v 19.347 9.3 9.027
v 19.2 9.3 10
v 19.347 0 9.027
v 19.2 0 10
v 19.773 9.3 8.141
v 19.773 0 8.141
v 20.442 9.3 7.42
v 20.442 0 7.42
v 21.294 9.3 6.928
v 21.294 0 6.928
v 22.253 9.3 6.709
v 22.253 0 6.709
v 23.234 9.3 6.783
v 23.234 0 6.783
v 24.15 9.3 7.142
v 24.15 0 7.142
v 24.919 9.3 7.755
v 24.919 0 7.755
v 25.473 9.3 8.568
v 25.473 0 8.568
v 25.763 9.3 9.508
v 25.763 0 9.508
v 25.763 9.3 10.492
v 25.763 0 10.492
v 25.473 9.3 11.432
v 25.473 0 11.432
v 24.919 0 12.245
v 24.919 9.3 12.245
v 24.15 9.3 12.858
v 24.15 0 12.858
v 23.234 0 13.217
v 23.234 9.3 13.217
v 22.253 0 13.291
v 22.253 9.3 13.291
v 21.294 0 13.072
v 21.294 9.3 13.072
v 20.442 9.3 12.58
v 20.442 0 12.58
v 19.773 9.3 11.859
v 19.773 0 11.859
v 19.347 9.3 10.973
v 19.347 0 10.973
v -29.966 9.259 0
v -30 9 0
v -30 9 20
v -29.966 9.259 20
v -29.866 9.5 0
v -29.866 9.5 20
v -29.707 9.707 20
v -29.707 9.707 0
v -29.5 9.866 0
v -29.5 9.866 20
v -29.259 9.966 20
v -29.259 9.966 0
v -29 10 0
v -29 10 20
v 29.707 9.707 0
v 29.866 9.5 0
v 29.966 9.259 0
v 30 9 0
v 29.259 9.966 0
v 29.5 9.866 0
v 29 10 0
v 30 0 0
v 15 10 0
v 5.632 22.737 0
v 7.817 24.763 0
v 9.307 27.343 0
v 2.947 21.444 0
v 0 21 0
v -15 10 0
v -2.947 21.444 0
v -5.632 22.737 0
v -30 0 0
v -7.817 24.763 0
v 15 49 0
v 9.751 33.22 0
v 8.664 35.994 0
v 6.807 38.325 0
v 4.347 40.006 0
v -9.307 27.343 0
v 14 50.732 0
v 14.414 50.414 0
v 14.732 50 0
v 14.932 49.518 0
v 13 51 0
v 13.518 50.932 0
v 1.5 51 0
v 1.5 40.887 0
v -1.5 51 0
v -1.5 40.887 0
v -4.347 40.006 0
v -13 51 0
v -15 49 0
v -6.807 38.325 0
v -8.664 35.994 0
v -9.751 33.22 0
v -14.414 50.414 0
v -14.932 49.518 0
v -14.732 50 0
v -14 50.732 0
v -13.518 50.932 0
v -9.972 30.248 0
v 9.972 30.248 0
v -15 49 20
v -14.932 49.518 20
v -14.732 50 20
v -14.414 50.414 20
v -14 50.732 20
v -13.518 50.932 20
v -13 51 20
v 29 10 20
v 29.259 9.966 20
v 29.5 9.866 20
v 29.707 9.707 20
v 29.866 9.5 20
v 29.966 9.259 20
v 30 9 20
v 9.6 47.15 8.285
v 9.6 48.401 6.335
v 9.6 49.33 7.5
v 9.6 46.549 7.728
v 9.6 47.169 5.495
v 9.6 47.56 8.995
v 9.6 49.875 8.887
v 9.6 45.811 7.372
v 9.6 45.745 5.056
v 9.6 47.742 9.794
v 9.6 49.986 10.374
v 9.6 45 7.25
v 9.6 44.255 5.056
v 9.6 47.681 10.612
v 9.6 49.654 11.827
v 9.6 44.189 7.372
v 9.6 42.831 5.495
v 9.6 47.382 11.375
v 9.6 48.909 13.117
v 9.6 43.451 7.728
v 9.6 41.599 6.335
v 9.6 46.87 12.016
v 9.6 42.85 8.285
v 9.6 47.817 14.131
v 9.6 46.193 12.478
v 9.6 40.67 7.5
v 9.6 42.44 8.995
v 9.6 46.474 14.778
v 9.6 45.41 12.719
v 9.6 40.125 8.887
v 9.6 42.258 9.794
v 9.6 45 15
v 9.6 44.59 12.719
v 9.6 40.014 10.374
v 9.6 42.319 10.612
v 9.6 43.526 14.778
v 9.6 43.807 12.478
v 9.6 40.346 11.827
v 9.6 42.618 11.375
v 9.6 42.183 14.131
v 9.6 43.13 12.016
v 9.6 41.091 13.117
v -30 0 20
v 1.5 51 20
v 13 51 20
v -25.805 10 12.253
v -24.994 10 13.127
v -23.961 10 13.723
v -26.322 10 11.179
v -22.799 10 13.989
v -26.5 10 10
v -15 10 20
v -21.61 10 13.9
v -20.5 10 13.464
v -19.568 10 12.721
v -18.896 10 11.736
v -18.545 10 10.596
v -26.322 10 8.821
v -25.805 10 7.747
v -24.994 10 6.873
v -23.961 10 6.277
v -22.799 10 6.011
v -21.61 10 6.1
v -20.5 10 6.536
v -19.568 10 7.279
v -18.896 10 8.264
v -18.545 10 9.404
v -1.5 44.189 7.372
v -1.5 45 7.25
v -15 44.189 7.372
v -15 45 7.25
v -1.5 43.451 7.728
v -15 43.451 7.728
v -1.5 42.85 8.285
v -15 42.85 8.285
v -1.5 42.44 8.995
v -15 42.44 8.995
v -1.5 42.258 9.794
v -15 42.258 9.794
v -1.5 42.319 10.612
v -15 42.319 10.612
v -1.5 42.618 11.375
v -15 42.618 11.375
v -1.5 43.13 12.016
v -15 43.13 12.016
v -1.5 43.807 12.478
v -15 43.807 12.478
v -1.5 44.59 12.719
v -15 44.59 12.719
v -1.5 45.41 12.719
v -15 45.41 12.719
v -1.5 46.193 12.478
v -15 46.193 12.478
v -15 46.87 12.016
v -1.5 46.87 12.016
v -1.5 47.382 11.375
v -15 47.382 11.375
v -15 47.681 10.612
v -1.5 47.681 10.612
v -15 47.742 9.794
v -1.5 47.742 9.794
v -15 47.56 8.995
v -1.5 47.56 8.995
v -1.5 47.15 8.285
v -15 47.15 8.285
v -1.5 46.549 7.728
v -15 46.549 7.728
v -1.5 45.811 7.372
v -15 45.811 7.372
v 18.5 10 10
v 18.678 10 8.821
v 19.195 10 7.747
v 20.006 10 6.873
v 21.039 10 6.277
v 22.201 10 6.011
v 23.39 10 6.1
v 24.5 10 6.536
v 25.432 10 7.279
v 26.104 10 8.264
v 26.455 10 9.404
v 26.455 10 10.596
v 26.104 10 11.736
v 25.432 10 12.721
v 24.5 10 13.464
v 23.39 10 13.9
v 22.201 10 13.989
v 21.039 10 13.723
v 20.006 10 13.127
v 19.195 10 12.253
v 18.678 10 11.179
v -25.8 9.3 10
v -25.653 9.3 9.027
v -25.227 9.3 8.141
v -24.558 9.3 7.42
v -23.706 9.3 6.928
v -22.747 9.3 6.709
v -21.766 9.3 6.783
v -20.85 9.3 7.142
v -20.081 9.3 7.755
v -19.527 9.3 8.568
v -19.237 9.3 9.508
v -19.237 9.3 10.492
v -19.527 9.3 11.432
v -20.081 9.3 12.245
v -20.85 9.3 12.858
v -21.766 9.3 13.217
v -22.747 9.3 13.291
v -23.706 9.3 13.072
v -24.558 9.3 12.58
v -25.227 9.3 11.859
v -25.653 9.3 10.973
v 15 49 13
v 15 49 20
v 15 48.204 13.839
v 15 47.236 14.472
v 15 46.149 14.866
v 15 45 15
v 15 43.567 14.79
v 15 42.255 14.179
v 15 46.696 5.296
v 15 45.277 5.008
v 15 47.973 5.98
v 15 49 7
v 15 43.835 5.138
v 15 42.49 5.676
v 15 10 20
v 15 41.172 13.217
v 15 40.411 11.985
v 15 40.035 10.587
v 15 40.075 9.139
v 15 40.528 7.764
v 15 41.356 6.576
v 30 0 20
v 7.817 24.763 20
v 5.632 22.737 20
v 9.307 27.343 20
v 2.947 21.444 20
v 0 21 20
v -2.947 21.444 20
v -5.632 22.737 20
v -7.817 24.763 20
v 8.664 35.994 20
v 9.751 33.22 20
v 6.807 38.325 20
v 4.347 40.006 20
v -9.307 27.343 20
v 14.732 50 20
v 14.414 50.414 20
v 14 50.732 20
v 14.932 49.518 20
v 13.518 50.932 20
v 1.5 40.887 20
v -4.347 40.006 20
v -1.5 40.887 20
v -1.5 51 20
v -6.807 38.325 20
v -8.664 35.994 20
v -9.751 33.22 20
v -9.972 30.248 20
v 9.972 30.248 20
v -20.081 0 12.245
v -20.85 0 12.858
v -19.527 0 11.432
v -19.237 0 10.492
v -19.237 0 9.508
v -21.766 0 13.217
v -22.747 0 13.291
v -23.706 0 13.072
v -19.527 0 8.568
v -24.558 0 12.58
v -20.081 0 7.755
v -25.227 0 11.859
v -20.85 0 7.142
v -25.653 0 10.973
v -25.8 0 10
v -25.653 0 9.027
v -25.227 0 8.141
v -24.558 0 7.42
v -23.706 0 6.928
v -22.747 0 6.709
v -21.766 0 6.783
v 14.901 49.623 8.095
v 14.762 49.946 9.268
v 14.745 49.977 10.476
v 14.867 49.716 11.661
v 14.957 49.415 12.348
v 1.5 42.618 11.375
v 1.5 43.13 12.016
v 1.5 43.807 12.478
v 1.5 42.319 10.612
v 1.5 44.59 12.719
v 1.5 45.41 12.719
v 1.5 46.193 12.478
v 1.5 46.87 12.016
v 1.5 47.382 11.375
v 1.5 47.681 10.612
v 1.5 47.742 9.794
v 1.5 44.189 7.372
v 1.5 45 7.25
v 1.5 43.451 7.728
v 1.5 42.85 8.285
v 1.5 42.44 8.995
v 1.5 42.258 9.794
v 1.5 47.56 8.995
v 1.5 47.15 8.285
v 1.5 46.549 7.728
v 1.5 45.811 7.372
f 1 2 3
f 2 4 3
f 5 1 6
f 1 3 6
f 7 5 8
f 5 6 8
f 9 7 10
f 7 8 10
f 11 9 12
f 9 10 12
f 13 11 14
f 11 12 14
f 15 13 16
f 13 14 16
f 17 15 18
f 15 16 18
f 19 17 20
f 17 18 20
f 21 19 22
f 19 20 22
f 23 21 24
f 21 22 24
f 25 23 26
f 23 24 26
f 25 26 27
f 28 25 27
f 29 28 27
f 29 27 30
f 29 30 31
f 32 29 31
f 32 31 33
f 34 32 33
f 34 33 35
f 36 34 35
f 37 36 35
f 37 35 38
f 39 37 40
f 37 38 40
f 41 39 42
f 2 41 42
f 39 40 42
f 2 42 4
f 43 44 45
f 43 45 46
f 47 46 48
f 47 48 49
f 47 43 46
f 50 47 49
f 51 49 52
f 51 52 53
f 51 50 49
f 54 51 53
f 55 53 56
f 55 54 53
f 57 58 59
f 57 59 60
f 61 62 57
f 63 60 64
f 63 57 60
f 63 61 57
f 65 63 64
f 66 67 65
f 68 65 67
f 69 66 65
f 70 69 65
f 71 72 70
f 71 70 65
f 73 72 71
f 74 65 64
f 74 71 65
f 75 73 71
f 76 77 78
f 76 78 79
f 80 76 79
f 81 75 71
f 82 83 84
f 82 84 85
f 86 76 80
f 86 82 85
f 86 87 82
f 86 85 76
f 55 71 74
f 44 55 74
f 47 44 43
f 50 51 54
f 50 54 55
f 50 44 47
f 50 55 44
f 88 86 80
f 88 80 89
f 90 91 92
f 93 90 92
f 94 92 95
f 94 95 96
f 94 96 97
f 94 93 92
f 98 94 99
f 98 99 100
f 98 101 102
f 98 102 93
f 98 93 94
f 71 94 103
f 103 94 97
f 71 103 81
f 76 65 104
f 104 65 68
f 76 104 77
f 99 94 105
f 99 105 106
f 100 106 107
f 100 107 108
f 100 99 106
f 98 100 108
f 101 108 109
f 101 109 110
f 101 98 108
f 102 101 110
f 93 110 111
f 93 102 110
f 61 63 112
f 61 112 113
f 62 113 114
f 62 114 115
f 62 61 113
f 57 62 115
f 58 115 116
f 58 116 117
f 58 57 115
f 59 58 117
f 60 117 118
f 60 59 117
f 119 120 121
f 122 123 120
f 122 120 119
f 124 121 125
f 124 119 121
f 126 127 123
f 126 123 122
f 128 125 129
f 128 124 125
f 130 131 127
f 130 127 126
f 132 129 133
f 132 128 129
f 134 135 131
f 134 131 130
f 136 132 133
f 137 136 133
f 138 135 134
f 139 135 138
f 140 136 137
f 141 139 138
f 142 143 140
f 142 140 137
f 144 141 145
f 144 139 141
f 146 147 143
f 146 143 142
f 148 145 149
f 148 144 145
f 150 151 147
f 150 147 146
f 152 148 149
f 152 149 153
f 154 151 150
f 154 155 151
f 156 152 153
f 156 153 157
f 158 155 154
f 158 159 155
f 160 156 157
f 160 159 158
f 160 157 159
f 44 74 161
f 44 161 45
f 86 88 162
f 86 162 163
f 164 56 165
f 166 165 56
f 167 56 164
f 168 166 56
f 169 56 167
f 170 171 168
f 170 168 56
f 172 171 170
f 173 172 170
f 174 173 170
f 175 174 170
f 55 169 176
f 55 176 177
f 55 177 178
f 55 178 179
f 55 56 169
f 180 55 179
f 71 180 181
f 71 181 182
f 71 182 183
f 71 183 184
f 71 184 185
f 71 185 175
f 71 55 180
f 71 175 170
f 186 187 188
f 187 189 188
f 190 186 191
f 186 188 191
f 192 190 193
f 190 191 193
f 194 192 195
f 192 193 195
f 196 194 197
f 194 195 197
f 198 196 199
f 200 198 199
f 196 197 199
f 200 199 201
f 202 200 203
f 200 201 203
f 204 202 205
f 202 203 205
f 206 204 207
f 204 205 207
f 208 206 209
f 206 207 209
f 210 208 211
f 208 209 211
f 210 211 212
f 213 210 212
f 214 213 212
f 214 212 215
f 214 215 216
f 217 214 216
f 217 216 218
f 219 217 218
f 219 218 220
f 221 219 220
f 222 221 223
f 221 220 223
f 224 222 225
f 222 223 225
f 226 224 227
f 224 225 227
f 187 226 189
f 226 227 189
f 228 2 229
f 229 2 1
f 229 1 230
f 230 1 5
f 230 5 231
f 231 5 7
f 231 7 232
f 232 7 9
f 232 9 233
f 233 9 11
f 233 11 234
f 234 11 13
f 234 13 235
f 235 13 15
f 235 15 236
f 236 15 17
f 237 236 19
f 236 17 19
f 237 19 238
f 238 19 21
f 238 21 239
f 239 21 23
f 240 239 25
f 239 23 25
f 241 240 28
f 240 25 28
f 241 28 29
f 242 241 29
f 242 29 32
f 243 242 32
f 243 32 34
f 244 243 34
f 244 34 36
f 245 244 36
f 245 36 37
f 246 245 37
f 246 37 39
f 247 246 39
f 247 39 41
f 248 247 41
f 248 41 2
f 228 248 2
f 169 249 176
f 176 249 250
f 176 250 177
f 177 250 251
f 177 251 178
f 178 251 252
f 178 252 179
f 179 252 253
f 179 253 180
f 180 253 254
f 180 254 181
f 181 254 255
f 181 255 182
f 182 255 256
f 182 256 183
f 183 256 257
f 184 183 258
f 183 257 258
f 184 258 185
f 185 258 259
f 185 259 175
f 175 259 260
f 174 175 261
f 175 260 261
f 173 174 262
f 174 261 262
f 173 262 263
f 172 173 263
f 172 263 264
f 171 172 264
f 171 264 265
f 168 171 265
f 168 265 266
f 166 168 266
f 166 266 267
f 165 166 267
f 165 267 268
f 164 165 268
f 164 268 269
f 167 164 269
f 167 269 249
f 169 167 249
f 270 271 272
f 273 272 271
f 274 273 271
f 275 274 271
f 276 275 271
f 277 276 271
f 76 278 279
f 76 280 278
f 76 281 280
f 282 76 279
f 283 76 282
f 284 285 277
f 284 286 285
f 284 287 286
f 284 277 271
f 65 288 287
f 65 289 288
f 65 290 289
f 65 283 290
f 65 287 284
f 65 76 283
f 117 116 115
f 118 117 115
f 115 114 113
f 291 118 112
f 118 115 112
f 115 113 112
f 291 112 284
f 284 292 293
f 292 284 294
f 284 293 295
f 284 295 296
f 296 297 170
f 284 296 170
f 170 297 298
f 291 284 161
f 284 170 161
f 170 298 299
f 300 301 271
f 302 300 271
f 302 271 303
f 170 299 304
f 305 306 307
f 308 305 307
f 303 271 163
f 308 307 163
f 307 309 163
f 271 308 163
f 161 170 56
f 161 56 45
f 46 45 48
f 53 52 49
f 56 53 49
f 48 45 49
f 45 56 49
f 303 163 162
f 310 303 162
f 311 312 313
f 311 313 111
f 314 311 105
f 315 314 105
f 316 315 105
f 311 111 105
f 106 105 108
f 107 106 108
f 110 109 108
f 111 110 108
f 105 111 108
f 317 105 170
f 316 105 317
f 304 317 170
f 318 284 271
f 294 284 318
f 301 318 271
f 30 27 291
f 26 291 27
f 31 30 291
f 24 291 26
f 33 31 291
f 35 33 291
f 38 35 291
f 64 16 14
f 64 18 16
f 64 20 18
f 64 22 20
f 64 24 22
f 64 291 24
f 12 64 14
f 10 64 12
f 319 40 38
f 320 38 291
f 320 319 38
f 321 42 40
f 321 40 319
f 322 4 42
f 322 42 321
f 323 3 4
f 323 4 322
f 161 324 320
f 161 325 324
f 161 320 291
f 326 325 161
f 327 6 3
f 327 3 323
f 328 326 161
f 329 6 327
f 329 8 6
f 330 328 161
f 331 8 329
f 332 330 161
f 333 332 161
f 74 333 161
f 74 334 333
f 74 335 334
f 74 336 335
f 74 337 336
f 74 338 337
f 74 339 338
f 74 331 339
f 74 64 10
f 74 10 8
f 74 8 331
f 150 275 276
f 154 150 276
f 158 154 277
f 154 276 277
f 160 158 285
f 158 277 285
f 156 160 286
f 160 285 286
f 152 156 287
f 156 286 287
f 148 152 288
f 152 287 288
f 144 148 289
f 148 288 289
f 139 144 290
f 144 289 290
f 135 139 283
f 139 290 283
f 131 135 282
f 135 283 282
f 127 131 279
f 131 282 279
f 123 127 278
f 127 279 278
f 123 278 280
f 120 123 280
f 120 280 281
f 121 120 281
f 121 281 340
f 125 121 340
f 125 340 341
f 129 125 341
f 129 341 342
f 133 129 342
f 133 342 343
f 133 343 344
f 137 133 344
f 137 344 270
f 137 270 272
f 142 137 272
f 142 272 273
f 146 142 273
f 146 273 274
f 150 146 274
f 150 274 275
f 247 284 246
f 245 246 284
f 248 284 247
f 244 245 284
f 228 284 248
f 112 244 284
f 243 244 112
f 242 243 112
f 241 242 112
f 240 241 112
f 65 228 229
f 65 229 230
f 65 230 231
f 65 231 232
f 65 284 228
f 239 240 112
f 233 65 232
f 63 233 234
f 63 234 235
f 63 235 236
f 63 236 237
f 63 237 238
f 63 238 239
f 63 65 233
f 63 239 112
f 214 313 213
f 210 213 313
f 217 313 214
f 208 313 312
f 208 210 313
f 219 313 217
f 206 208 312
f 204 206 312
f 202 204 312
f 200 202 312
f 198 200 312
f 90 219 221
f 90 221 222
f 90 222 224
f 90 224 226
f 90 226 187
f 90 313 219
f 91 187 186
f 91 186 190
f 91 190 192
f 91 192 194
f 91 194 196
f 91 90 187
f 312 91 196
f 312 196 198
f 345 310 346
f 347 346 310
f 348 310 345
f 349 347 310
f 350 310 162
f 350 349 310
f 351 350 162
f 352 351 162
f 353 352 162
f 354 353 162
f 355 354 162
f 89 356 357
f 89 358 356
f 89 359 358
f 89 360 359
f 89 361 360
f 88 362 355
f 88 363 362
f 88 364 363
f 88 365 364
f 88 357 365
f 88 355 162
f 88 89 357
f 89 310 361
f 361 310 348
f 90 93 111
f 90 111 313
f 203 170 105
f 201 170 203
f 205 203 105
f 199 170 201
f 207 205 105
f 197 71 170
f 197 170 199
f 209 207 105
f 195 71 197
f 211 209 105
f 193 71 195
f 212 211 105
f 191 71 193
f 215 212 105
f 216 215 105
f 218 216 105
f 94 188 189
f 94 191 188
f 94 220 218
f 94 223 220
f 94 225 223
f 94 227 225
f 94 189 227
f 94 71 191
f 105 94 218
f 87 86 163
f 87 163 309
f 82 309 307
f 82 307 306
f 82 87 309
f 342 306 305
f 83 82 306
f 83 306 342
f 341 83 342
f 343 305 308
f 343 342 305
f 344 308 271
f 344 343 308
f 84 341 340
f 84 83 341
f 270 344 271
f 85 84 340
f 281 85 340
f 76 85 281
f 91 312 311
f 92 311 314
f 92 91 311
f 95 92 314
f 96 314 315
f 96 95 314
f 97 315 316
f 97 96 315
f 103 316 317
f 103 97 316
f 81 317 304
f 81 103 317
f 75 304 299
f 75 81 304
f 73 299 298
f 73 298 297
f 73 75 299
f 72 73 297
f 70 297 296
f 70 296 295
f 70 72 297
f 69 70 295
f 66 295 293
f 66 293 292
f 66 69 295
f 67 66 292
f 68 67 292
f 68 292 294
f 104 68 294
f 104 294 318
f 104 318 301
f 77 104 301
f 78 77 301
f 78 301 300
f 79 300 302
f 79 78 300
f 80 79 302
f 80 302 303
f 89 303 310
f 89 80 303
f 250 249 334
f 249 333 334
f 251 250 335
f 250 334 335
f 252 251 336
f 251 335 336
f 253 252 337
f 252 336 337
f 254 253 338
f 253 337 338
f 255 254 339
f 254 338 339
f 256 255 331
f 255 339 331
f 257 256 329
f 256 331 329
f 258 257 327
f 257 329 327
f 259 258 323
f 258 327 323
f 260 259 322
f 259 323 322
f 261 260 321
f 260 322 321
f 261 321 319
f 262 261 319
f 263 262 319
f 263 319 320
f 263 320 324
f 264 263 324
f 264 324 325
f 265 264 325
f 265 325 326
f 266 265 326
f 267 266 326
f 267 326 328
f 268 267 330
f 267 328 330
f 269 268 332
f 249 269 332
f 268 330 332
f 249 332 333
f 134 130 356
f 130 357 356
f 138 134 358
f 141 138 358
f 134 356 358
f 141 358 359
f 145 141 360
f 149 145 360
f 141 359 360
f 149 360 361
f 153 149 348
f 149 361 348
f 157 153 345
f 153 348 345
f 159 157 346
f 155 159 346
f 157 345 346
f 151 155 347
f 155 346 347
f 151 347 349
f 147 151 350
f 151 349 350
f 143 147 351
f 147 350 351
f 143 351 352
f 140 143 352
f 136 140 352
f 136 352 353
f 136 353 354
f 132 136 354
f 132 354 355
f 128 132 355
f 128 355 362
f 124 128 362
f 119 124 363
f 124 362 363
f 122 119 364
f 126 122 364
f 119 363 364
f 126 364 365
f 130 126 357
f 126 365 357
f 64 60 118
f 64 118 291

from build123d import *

# Parameters (mm, degrees)
BOSS_EXTRUDE1_DEPTH                                  = 20
CSK_FOR_M6_HEX_SOCKET_COUNTERSUNK_CAP_SC_D           = 6.6
CSK_FOR_M6_HEX_SOCKET_COUNTERSUNK_CAP_SC_CSINK_D     = 8
CSK_FOR_M6_HEX_SOCKET_COUNTERSUNK_CAP_SC_CSINK_ANGLE = 90
CBORE_FOR_M5_HEX_SOCKET_HEAD_CAP_SCREW1_D            = 5.5
CBORE_FOR_M5_HEX_SOCKET_HEAD_CAP_SCREW1_CBORE_D      = 10
CBORE_FOR_M5_HEX_SOCKET_HEAD_CAP_SCREW1_CBORE_DEPTH  = 5.4


with BuildPart() as part:
    # Sketch1 → Boss-Extrude1 (new body)
    with BuildSketch(Plane.XY):
        with BuildLine():
            Line((30, 0), (-30, 0))
            Line((-30, 0), (-30, 9))
            ThreePointArc((-30, 9), (-29.707106781, 9.707106781), (-29, 10))
            Line((-29, 10), (-15, 10))
            Line((-15, 10), (-15, 49))
            ThreePointArc((-15, 49), (-14.414213562, 50.414213562), (-13, 51))
            Line((-13, 51), (-1.5, 51))
            Line((-1.5, 51), (-1.5, 40.886859967))
            ThreePointArc((-1.5, 40.886859967), (0, 21), (1.5, 40.886859967))
            Line((1.5, 40.886859967), (1.5, 51))
            Line((1.5, 51), (13, 51))
            ThreePointArc((13, 51), (14.414213562, 50.414213562), (15, 49))
            Line((15, 49), (15, 10))
            Line((15, 10), (29, 10))
            ThreePointArc((29, 10), (29.707106781, 9.707106781), (30, 9))
            Line((30, 9), (30, 0))
        make_face()
    extrude(amount=BOSS_EXTRUDE1_DEPTH)

    # CSK for M6 Hex Socket Countersunk Cap Screw1 (through all)
    with Locations(Plane(origin=(-22.5, 10, 10), x_dir=(1, 0, 0), z_dir=(0, 1, 0))):
        with Locations((0, 0), (45, 0)):
            CounterSinkHole(CSK_FOR_M6_HEX_SOCKET_COUNTERSUNK_CAP_SC_D / 2, CSK_FOR_M6_HEX_SOCKET_COUNTERSUNK_CAP_SC_CSINK_D / 2, counter_sink_angle=CSK_FOR_M6_HEX_SOCKET_COUNTERSUNK_CAP_SC_CSINK_ANGLE)

    # CBORE for M5 Hex Socket Head Cap Screw1 (through all)
    with Locations(Plane(origin=(15, 45, 10), x_dir=(0, 0, 1), z_dir=(1, 0, 0))):
        with Locations((0, 0)):
            CounterBoreHole(CBORE_FOR_M5_HEX_SOCKET_HEAD_CAP_SCREW1_D / 2, CBORE_FOR_M5_HEX_SOCKET_HEAD_CAP_SCREW1_CBORE_D / 2, CBORE_FOR_M5_HEX_SOCKET_HEAD_CAP_SCREW1_CBORE_DEPTH)


solid = part.part
